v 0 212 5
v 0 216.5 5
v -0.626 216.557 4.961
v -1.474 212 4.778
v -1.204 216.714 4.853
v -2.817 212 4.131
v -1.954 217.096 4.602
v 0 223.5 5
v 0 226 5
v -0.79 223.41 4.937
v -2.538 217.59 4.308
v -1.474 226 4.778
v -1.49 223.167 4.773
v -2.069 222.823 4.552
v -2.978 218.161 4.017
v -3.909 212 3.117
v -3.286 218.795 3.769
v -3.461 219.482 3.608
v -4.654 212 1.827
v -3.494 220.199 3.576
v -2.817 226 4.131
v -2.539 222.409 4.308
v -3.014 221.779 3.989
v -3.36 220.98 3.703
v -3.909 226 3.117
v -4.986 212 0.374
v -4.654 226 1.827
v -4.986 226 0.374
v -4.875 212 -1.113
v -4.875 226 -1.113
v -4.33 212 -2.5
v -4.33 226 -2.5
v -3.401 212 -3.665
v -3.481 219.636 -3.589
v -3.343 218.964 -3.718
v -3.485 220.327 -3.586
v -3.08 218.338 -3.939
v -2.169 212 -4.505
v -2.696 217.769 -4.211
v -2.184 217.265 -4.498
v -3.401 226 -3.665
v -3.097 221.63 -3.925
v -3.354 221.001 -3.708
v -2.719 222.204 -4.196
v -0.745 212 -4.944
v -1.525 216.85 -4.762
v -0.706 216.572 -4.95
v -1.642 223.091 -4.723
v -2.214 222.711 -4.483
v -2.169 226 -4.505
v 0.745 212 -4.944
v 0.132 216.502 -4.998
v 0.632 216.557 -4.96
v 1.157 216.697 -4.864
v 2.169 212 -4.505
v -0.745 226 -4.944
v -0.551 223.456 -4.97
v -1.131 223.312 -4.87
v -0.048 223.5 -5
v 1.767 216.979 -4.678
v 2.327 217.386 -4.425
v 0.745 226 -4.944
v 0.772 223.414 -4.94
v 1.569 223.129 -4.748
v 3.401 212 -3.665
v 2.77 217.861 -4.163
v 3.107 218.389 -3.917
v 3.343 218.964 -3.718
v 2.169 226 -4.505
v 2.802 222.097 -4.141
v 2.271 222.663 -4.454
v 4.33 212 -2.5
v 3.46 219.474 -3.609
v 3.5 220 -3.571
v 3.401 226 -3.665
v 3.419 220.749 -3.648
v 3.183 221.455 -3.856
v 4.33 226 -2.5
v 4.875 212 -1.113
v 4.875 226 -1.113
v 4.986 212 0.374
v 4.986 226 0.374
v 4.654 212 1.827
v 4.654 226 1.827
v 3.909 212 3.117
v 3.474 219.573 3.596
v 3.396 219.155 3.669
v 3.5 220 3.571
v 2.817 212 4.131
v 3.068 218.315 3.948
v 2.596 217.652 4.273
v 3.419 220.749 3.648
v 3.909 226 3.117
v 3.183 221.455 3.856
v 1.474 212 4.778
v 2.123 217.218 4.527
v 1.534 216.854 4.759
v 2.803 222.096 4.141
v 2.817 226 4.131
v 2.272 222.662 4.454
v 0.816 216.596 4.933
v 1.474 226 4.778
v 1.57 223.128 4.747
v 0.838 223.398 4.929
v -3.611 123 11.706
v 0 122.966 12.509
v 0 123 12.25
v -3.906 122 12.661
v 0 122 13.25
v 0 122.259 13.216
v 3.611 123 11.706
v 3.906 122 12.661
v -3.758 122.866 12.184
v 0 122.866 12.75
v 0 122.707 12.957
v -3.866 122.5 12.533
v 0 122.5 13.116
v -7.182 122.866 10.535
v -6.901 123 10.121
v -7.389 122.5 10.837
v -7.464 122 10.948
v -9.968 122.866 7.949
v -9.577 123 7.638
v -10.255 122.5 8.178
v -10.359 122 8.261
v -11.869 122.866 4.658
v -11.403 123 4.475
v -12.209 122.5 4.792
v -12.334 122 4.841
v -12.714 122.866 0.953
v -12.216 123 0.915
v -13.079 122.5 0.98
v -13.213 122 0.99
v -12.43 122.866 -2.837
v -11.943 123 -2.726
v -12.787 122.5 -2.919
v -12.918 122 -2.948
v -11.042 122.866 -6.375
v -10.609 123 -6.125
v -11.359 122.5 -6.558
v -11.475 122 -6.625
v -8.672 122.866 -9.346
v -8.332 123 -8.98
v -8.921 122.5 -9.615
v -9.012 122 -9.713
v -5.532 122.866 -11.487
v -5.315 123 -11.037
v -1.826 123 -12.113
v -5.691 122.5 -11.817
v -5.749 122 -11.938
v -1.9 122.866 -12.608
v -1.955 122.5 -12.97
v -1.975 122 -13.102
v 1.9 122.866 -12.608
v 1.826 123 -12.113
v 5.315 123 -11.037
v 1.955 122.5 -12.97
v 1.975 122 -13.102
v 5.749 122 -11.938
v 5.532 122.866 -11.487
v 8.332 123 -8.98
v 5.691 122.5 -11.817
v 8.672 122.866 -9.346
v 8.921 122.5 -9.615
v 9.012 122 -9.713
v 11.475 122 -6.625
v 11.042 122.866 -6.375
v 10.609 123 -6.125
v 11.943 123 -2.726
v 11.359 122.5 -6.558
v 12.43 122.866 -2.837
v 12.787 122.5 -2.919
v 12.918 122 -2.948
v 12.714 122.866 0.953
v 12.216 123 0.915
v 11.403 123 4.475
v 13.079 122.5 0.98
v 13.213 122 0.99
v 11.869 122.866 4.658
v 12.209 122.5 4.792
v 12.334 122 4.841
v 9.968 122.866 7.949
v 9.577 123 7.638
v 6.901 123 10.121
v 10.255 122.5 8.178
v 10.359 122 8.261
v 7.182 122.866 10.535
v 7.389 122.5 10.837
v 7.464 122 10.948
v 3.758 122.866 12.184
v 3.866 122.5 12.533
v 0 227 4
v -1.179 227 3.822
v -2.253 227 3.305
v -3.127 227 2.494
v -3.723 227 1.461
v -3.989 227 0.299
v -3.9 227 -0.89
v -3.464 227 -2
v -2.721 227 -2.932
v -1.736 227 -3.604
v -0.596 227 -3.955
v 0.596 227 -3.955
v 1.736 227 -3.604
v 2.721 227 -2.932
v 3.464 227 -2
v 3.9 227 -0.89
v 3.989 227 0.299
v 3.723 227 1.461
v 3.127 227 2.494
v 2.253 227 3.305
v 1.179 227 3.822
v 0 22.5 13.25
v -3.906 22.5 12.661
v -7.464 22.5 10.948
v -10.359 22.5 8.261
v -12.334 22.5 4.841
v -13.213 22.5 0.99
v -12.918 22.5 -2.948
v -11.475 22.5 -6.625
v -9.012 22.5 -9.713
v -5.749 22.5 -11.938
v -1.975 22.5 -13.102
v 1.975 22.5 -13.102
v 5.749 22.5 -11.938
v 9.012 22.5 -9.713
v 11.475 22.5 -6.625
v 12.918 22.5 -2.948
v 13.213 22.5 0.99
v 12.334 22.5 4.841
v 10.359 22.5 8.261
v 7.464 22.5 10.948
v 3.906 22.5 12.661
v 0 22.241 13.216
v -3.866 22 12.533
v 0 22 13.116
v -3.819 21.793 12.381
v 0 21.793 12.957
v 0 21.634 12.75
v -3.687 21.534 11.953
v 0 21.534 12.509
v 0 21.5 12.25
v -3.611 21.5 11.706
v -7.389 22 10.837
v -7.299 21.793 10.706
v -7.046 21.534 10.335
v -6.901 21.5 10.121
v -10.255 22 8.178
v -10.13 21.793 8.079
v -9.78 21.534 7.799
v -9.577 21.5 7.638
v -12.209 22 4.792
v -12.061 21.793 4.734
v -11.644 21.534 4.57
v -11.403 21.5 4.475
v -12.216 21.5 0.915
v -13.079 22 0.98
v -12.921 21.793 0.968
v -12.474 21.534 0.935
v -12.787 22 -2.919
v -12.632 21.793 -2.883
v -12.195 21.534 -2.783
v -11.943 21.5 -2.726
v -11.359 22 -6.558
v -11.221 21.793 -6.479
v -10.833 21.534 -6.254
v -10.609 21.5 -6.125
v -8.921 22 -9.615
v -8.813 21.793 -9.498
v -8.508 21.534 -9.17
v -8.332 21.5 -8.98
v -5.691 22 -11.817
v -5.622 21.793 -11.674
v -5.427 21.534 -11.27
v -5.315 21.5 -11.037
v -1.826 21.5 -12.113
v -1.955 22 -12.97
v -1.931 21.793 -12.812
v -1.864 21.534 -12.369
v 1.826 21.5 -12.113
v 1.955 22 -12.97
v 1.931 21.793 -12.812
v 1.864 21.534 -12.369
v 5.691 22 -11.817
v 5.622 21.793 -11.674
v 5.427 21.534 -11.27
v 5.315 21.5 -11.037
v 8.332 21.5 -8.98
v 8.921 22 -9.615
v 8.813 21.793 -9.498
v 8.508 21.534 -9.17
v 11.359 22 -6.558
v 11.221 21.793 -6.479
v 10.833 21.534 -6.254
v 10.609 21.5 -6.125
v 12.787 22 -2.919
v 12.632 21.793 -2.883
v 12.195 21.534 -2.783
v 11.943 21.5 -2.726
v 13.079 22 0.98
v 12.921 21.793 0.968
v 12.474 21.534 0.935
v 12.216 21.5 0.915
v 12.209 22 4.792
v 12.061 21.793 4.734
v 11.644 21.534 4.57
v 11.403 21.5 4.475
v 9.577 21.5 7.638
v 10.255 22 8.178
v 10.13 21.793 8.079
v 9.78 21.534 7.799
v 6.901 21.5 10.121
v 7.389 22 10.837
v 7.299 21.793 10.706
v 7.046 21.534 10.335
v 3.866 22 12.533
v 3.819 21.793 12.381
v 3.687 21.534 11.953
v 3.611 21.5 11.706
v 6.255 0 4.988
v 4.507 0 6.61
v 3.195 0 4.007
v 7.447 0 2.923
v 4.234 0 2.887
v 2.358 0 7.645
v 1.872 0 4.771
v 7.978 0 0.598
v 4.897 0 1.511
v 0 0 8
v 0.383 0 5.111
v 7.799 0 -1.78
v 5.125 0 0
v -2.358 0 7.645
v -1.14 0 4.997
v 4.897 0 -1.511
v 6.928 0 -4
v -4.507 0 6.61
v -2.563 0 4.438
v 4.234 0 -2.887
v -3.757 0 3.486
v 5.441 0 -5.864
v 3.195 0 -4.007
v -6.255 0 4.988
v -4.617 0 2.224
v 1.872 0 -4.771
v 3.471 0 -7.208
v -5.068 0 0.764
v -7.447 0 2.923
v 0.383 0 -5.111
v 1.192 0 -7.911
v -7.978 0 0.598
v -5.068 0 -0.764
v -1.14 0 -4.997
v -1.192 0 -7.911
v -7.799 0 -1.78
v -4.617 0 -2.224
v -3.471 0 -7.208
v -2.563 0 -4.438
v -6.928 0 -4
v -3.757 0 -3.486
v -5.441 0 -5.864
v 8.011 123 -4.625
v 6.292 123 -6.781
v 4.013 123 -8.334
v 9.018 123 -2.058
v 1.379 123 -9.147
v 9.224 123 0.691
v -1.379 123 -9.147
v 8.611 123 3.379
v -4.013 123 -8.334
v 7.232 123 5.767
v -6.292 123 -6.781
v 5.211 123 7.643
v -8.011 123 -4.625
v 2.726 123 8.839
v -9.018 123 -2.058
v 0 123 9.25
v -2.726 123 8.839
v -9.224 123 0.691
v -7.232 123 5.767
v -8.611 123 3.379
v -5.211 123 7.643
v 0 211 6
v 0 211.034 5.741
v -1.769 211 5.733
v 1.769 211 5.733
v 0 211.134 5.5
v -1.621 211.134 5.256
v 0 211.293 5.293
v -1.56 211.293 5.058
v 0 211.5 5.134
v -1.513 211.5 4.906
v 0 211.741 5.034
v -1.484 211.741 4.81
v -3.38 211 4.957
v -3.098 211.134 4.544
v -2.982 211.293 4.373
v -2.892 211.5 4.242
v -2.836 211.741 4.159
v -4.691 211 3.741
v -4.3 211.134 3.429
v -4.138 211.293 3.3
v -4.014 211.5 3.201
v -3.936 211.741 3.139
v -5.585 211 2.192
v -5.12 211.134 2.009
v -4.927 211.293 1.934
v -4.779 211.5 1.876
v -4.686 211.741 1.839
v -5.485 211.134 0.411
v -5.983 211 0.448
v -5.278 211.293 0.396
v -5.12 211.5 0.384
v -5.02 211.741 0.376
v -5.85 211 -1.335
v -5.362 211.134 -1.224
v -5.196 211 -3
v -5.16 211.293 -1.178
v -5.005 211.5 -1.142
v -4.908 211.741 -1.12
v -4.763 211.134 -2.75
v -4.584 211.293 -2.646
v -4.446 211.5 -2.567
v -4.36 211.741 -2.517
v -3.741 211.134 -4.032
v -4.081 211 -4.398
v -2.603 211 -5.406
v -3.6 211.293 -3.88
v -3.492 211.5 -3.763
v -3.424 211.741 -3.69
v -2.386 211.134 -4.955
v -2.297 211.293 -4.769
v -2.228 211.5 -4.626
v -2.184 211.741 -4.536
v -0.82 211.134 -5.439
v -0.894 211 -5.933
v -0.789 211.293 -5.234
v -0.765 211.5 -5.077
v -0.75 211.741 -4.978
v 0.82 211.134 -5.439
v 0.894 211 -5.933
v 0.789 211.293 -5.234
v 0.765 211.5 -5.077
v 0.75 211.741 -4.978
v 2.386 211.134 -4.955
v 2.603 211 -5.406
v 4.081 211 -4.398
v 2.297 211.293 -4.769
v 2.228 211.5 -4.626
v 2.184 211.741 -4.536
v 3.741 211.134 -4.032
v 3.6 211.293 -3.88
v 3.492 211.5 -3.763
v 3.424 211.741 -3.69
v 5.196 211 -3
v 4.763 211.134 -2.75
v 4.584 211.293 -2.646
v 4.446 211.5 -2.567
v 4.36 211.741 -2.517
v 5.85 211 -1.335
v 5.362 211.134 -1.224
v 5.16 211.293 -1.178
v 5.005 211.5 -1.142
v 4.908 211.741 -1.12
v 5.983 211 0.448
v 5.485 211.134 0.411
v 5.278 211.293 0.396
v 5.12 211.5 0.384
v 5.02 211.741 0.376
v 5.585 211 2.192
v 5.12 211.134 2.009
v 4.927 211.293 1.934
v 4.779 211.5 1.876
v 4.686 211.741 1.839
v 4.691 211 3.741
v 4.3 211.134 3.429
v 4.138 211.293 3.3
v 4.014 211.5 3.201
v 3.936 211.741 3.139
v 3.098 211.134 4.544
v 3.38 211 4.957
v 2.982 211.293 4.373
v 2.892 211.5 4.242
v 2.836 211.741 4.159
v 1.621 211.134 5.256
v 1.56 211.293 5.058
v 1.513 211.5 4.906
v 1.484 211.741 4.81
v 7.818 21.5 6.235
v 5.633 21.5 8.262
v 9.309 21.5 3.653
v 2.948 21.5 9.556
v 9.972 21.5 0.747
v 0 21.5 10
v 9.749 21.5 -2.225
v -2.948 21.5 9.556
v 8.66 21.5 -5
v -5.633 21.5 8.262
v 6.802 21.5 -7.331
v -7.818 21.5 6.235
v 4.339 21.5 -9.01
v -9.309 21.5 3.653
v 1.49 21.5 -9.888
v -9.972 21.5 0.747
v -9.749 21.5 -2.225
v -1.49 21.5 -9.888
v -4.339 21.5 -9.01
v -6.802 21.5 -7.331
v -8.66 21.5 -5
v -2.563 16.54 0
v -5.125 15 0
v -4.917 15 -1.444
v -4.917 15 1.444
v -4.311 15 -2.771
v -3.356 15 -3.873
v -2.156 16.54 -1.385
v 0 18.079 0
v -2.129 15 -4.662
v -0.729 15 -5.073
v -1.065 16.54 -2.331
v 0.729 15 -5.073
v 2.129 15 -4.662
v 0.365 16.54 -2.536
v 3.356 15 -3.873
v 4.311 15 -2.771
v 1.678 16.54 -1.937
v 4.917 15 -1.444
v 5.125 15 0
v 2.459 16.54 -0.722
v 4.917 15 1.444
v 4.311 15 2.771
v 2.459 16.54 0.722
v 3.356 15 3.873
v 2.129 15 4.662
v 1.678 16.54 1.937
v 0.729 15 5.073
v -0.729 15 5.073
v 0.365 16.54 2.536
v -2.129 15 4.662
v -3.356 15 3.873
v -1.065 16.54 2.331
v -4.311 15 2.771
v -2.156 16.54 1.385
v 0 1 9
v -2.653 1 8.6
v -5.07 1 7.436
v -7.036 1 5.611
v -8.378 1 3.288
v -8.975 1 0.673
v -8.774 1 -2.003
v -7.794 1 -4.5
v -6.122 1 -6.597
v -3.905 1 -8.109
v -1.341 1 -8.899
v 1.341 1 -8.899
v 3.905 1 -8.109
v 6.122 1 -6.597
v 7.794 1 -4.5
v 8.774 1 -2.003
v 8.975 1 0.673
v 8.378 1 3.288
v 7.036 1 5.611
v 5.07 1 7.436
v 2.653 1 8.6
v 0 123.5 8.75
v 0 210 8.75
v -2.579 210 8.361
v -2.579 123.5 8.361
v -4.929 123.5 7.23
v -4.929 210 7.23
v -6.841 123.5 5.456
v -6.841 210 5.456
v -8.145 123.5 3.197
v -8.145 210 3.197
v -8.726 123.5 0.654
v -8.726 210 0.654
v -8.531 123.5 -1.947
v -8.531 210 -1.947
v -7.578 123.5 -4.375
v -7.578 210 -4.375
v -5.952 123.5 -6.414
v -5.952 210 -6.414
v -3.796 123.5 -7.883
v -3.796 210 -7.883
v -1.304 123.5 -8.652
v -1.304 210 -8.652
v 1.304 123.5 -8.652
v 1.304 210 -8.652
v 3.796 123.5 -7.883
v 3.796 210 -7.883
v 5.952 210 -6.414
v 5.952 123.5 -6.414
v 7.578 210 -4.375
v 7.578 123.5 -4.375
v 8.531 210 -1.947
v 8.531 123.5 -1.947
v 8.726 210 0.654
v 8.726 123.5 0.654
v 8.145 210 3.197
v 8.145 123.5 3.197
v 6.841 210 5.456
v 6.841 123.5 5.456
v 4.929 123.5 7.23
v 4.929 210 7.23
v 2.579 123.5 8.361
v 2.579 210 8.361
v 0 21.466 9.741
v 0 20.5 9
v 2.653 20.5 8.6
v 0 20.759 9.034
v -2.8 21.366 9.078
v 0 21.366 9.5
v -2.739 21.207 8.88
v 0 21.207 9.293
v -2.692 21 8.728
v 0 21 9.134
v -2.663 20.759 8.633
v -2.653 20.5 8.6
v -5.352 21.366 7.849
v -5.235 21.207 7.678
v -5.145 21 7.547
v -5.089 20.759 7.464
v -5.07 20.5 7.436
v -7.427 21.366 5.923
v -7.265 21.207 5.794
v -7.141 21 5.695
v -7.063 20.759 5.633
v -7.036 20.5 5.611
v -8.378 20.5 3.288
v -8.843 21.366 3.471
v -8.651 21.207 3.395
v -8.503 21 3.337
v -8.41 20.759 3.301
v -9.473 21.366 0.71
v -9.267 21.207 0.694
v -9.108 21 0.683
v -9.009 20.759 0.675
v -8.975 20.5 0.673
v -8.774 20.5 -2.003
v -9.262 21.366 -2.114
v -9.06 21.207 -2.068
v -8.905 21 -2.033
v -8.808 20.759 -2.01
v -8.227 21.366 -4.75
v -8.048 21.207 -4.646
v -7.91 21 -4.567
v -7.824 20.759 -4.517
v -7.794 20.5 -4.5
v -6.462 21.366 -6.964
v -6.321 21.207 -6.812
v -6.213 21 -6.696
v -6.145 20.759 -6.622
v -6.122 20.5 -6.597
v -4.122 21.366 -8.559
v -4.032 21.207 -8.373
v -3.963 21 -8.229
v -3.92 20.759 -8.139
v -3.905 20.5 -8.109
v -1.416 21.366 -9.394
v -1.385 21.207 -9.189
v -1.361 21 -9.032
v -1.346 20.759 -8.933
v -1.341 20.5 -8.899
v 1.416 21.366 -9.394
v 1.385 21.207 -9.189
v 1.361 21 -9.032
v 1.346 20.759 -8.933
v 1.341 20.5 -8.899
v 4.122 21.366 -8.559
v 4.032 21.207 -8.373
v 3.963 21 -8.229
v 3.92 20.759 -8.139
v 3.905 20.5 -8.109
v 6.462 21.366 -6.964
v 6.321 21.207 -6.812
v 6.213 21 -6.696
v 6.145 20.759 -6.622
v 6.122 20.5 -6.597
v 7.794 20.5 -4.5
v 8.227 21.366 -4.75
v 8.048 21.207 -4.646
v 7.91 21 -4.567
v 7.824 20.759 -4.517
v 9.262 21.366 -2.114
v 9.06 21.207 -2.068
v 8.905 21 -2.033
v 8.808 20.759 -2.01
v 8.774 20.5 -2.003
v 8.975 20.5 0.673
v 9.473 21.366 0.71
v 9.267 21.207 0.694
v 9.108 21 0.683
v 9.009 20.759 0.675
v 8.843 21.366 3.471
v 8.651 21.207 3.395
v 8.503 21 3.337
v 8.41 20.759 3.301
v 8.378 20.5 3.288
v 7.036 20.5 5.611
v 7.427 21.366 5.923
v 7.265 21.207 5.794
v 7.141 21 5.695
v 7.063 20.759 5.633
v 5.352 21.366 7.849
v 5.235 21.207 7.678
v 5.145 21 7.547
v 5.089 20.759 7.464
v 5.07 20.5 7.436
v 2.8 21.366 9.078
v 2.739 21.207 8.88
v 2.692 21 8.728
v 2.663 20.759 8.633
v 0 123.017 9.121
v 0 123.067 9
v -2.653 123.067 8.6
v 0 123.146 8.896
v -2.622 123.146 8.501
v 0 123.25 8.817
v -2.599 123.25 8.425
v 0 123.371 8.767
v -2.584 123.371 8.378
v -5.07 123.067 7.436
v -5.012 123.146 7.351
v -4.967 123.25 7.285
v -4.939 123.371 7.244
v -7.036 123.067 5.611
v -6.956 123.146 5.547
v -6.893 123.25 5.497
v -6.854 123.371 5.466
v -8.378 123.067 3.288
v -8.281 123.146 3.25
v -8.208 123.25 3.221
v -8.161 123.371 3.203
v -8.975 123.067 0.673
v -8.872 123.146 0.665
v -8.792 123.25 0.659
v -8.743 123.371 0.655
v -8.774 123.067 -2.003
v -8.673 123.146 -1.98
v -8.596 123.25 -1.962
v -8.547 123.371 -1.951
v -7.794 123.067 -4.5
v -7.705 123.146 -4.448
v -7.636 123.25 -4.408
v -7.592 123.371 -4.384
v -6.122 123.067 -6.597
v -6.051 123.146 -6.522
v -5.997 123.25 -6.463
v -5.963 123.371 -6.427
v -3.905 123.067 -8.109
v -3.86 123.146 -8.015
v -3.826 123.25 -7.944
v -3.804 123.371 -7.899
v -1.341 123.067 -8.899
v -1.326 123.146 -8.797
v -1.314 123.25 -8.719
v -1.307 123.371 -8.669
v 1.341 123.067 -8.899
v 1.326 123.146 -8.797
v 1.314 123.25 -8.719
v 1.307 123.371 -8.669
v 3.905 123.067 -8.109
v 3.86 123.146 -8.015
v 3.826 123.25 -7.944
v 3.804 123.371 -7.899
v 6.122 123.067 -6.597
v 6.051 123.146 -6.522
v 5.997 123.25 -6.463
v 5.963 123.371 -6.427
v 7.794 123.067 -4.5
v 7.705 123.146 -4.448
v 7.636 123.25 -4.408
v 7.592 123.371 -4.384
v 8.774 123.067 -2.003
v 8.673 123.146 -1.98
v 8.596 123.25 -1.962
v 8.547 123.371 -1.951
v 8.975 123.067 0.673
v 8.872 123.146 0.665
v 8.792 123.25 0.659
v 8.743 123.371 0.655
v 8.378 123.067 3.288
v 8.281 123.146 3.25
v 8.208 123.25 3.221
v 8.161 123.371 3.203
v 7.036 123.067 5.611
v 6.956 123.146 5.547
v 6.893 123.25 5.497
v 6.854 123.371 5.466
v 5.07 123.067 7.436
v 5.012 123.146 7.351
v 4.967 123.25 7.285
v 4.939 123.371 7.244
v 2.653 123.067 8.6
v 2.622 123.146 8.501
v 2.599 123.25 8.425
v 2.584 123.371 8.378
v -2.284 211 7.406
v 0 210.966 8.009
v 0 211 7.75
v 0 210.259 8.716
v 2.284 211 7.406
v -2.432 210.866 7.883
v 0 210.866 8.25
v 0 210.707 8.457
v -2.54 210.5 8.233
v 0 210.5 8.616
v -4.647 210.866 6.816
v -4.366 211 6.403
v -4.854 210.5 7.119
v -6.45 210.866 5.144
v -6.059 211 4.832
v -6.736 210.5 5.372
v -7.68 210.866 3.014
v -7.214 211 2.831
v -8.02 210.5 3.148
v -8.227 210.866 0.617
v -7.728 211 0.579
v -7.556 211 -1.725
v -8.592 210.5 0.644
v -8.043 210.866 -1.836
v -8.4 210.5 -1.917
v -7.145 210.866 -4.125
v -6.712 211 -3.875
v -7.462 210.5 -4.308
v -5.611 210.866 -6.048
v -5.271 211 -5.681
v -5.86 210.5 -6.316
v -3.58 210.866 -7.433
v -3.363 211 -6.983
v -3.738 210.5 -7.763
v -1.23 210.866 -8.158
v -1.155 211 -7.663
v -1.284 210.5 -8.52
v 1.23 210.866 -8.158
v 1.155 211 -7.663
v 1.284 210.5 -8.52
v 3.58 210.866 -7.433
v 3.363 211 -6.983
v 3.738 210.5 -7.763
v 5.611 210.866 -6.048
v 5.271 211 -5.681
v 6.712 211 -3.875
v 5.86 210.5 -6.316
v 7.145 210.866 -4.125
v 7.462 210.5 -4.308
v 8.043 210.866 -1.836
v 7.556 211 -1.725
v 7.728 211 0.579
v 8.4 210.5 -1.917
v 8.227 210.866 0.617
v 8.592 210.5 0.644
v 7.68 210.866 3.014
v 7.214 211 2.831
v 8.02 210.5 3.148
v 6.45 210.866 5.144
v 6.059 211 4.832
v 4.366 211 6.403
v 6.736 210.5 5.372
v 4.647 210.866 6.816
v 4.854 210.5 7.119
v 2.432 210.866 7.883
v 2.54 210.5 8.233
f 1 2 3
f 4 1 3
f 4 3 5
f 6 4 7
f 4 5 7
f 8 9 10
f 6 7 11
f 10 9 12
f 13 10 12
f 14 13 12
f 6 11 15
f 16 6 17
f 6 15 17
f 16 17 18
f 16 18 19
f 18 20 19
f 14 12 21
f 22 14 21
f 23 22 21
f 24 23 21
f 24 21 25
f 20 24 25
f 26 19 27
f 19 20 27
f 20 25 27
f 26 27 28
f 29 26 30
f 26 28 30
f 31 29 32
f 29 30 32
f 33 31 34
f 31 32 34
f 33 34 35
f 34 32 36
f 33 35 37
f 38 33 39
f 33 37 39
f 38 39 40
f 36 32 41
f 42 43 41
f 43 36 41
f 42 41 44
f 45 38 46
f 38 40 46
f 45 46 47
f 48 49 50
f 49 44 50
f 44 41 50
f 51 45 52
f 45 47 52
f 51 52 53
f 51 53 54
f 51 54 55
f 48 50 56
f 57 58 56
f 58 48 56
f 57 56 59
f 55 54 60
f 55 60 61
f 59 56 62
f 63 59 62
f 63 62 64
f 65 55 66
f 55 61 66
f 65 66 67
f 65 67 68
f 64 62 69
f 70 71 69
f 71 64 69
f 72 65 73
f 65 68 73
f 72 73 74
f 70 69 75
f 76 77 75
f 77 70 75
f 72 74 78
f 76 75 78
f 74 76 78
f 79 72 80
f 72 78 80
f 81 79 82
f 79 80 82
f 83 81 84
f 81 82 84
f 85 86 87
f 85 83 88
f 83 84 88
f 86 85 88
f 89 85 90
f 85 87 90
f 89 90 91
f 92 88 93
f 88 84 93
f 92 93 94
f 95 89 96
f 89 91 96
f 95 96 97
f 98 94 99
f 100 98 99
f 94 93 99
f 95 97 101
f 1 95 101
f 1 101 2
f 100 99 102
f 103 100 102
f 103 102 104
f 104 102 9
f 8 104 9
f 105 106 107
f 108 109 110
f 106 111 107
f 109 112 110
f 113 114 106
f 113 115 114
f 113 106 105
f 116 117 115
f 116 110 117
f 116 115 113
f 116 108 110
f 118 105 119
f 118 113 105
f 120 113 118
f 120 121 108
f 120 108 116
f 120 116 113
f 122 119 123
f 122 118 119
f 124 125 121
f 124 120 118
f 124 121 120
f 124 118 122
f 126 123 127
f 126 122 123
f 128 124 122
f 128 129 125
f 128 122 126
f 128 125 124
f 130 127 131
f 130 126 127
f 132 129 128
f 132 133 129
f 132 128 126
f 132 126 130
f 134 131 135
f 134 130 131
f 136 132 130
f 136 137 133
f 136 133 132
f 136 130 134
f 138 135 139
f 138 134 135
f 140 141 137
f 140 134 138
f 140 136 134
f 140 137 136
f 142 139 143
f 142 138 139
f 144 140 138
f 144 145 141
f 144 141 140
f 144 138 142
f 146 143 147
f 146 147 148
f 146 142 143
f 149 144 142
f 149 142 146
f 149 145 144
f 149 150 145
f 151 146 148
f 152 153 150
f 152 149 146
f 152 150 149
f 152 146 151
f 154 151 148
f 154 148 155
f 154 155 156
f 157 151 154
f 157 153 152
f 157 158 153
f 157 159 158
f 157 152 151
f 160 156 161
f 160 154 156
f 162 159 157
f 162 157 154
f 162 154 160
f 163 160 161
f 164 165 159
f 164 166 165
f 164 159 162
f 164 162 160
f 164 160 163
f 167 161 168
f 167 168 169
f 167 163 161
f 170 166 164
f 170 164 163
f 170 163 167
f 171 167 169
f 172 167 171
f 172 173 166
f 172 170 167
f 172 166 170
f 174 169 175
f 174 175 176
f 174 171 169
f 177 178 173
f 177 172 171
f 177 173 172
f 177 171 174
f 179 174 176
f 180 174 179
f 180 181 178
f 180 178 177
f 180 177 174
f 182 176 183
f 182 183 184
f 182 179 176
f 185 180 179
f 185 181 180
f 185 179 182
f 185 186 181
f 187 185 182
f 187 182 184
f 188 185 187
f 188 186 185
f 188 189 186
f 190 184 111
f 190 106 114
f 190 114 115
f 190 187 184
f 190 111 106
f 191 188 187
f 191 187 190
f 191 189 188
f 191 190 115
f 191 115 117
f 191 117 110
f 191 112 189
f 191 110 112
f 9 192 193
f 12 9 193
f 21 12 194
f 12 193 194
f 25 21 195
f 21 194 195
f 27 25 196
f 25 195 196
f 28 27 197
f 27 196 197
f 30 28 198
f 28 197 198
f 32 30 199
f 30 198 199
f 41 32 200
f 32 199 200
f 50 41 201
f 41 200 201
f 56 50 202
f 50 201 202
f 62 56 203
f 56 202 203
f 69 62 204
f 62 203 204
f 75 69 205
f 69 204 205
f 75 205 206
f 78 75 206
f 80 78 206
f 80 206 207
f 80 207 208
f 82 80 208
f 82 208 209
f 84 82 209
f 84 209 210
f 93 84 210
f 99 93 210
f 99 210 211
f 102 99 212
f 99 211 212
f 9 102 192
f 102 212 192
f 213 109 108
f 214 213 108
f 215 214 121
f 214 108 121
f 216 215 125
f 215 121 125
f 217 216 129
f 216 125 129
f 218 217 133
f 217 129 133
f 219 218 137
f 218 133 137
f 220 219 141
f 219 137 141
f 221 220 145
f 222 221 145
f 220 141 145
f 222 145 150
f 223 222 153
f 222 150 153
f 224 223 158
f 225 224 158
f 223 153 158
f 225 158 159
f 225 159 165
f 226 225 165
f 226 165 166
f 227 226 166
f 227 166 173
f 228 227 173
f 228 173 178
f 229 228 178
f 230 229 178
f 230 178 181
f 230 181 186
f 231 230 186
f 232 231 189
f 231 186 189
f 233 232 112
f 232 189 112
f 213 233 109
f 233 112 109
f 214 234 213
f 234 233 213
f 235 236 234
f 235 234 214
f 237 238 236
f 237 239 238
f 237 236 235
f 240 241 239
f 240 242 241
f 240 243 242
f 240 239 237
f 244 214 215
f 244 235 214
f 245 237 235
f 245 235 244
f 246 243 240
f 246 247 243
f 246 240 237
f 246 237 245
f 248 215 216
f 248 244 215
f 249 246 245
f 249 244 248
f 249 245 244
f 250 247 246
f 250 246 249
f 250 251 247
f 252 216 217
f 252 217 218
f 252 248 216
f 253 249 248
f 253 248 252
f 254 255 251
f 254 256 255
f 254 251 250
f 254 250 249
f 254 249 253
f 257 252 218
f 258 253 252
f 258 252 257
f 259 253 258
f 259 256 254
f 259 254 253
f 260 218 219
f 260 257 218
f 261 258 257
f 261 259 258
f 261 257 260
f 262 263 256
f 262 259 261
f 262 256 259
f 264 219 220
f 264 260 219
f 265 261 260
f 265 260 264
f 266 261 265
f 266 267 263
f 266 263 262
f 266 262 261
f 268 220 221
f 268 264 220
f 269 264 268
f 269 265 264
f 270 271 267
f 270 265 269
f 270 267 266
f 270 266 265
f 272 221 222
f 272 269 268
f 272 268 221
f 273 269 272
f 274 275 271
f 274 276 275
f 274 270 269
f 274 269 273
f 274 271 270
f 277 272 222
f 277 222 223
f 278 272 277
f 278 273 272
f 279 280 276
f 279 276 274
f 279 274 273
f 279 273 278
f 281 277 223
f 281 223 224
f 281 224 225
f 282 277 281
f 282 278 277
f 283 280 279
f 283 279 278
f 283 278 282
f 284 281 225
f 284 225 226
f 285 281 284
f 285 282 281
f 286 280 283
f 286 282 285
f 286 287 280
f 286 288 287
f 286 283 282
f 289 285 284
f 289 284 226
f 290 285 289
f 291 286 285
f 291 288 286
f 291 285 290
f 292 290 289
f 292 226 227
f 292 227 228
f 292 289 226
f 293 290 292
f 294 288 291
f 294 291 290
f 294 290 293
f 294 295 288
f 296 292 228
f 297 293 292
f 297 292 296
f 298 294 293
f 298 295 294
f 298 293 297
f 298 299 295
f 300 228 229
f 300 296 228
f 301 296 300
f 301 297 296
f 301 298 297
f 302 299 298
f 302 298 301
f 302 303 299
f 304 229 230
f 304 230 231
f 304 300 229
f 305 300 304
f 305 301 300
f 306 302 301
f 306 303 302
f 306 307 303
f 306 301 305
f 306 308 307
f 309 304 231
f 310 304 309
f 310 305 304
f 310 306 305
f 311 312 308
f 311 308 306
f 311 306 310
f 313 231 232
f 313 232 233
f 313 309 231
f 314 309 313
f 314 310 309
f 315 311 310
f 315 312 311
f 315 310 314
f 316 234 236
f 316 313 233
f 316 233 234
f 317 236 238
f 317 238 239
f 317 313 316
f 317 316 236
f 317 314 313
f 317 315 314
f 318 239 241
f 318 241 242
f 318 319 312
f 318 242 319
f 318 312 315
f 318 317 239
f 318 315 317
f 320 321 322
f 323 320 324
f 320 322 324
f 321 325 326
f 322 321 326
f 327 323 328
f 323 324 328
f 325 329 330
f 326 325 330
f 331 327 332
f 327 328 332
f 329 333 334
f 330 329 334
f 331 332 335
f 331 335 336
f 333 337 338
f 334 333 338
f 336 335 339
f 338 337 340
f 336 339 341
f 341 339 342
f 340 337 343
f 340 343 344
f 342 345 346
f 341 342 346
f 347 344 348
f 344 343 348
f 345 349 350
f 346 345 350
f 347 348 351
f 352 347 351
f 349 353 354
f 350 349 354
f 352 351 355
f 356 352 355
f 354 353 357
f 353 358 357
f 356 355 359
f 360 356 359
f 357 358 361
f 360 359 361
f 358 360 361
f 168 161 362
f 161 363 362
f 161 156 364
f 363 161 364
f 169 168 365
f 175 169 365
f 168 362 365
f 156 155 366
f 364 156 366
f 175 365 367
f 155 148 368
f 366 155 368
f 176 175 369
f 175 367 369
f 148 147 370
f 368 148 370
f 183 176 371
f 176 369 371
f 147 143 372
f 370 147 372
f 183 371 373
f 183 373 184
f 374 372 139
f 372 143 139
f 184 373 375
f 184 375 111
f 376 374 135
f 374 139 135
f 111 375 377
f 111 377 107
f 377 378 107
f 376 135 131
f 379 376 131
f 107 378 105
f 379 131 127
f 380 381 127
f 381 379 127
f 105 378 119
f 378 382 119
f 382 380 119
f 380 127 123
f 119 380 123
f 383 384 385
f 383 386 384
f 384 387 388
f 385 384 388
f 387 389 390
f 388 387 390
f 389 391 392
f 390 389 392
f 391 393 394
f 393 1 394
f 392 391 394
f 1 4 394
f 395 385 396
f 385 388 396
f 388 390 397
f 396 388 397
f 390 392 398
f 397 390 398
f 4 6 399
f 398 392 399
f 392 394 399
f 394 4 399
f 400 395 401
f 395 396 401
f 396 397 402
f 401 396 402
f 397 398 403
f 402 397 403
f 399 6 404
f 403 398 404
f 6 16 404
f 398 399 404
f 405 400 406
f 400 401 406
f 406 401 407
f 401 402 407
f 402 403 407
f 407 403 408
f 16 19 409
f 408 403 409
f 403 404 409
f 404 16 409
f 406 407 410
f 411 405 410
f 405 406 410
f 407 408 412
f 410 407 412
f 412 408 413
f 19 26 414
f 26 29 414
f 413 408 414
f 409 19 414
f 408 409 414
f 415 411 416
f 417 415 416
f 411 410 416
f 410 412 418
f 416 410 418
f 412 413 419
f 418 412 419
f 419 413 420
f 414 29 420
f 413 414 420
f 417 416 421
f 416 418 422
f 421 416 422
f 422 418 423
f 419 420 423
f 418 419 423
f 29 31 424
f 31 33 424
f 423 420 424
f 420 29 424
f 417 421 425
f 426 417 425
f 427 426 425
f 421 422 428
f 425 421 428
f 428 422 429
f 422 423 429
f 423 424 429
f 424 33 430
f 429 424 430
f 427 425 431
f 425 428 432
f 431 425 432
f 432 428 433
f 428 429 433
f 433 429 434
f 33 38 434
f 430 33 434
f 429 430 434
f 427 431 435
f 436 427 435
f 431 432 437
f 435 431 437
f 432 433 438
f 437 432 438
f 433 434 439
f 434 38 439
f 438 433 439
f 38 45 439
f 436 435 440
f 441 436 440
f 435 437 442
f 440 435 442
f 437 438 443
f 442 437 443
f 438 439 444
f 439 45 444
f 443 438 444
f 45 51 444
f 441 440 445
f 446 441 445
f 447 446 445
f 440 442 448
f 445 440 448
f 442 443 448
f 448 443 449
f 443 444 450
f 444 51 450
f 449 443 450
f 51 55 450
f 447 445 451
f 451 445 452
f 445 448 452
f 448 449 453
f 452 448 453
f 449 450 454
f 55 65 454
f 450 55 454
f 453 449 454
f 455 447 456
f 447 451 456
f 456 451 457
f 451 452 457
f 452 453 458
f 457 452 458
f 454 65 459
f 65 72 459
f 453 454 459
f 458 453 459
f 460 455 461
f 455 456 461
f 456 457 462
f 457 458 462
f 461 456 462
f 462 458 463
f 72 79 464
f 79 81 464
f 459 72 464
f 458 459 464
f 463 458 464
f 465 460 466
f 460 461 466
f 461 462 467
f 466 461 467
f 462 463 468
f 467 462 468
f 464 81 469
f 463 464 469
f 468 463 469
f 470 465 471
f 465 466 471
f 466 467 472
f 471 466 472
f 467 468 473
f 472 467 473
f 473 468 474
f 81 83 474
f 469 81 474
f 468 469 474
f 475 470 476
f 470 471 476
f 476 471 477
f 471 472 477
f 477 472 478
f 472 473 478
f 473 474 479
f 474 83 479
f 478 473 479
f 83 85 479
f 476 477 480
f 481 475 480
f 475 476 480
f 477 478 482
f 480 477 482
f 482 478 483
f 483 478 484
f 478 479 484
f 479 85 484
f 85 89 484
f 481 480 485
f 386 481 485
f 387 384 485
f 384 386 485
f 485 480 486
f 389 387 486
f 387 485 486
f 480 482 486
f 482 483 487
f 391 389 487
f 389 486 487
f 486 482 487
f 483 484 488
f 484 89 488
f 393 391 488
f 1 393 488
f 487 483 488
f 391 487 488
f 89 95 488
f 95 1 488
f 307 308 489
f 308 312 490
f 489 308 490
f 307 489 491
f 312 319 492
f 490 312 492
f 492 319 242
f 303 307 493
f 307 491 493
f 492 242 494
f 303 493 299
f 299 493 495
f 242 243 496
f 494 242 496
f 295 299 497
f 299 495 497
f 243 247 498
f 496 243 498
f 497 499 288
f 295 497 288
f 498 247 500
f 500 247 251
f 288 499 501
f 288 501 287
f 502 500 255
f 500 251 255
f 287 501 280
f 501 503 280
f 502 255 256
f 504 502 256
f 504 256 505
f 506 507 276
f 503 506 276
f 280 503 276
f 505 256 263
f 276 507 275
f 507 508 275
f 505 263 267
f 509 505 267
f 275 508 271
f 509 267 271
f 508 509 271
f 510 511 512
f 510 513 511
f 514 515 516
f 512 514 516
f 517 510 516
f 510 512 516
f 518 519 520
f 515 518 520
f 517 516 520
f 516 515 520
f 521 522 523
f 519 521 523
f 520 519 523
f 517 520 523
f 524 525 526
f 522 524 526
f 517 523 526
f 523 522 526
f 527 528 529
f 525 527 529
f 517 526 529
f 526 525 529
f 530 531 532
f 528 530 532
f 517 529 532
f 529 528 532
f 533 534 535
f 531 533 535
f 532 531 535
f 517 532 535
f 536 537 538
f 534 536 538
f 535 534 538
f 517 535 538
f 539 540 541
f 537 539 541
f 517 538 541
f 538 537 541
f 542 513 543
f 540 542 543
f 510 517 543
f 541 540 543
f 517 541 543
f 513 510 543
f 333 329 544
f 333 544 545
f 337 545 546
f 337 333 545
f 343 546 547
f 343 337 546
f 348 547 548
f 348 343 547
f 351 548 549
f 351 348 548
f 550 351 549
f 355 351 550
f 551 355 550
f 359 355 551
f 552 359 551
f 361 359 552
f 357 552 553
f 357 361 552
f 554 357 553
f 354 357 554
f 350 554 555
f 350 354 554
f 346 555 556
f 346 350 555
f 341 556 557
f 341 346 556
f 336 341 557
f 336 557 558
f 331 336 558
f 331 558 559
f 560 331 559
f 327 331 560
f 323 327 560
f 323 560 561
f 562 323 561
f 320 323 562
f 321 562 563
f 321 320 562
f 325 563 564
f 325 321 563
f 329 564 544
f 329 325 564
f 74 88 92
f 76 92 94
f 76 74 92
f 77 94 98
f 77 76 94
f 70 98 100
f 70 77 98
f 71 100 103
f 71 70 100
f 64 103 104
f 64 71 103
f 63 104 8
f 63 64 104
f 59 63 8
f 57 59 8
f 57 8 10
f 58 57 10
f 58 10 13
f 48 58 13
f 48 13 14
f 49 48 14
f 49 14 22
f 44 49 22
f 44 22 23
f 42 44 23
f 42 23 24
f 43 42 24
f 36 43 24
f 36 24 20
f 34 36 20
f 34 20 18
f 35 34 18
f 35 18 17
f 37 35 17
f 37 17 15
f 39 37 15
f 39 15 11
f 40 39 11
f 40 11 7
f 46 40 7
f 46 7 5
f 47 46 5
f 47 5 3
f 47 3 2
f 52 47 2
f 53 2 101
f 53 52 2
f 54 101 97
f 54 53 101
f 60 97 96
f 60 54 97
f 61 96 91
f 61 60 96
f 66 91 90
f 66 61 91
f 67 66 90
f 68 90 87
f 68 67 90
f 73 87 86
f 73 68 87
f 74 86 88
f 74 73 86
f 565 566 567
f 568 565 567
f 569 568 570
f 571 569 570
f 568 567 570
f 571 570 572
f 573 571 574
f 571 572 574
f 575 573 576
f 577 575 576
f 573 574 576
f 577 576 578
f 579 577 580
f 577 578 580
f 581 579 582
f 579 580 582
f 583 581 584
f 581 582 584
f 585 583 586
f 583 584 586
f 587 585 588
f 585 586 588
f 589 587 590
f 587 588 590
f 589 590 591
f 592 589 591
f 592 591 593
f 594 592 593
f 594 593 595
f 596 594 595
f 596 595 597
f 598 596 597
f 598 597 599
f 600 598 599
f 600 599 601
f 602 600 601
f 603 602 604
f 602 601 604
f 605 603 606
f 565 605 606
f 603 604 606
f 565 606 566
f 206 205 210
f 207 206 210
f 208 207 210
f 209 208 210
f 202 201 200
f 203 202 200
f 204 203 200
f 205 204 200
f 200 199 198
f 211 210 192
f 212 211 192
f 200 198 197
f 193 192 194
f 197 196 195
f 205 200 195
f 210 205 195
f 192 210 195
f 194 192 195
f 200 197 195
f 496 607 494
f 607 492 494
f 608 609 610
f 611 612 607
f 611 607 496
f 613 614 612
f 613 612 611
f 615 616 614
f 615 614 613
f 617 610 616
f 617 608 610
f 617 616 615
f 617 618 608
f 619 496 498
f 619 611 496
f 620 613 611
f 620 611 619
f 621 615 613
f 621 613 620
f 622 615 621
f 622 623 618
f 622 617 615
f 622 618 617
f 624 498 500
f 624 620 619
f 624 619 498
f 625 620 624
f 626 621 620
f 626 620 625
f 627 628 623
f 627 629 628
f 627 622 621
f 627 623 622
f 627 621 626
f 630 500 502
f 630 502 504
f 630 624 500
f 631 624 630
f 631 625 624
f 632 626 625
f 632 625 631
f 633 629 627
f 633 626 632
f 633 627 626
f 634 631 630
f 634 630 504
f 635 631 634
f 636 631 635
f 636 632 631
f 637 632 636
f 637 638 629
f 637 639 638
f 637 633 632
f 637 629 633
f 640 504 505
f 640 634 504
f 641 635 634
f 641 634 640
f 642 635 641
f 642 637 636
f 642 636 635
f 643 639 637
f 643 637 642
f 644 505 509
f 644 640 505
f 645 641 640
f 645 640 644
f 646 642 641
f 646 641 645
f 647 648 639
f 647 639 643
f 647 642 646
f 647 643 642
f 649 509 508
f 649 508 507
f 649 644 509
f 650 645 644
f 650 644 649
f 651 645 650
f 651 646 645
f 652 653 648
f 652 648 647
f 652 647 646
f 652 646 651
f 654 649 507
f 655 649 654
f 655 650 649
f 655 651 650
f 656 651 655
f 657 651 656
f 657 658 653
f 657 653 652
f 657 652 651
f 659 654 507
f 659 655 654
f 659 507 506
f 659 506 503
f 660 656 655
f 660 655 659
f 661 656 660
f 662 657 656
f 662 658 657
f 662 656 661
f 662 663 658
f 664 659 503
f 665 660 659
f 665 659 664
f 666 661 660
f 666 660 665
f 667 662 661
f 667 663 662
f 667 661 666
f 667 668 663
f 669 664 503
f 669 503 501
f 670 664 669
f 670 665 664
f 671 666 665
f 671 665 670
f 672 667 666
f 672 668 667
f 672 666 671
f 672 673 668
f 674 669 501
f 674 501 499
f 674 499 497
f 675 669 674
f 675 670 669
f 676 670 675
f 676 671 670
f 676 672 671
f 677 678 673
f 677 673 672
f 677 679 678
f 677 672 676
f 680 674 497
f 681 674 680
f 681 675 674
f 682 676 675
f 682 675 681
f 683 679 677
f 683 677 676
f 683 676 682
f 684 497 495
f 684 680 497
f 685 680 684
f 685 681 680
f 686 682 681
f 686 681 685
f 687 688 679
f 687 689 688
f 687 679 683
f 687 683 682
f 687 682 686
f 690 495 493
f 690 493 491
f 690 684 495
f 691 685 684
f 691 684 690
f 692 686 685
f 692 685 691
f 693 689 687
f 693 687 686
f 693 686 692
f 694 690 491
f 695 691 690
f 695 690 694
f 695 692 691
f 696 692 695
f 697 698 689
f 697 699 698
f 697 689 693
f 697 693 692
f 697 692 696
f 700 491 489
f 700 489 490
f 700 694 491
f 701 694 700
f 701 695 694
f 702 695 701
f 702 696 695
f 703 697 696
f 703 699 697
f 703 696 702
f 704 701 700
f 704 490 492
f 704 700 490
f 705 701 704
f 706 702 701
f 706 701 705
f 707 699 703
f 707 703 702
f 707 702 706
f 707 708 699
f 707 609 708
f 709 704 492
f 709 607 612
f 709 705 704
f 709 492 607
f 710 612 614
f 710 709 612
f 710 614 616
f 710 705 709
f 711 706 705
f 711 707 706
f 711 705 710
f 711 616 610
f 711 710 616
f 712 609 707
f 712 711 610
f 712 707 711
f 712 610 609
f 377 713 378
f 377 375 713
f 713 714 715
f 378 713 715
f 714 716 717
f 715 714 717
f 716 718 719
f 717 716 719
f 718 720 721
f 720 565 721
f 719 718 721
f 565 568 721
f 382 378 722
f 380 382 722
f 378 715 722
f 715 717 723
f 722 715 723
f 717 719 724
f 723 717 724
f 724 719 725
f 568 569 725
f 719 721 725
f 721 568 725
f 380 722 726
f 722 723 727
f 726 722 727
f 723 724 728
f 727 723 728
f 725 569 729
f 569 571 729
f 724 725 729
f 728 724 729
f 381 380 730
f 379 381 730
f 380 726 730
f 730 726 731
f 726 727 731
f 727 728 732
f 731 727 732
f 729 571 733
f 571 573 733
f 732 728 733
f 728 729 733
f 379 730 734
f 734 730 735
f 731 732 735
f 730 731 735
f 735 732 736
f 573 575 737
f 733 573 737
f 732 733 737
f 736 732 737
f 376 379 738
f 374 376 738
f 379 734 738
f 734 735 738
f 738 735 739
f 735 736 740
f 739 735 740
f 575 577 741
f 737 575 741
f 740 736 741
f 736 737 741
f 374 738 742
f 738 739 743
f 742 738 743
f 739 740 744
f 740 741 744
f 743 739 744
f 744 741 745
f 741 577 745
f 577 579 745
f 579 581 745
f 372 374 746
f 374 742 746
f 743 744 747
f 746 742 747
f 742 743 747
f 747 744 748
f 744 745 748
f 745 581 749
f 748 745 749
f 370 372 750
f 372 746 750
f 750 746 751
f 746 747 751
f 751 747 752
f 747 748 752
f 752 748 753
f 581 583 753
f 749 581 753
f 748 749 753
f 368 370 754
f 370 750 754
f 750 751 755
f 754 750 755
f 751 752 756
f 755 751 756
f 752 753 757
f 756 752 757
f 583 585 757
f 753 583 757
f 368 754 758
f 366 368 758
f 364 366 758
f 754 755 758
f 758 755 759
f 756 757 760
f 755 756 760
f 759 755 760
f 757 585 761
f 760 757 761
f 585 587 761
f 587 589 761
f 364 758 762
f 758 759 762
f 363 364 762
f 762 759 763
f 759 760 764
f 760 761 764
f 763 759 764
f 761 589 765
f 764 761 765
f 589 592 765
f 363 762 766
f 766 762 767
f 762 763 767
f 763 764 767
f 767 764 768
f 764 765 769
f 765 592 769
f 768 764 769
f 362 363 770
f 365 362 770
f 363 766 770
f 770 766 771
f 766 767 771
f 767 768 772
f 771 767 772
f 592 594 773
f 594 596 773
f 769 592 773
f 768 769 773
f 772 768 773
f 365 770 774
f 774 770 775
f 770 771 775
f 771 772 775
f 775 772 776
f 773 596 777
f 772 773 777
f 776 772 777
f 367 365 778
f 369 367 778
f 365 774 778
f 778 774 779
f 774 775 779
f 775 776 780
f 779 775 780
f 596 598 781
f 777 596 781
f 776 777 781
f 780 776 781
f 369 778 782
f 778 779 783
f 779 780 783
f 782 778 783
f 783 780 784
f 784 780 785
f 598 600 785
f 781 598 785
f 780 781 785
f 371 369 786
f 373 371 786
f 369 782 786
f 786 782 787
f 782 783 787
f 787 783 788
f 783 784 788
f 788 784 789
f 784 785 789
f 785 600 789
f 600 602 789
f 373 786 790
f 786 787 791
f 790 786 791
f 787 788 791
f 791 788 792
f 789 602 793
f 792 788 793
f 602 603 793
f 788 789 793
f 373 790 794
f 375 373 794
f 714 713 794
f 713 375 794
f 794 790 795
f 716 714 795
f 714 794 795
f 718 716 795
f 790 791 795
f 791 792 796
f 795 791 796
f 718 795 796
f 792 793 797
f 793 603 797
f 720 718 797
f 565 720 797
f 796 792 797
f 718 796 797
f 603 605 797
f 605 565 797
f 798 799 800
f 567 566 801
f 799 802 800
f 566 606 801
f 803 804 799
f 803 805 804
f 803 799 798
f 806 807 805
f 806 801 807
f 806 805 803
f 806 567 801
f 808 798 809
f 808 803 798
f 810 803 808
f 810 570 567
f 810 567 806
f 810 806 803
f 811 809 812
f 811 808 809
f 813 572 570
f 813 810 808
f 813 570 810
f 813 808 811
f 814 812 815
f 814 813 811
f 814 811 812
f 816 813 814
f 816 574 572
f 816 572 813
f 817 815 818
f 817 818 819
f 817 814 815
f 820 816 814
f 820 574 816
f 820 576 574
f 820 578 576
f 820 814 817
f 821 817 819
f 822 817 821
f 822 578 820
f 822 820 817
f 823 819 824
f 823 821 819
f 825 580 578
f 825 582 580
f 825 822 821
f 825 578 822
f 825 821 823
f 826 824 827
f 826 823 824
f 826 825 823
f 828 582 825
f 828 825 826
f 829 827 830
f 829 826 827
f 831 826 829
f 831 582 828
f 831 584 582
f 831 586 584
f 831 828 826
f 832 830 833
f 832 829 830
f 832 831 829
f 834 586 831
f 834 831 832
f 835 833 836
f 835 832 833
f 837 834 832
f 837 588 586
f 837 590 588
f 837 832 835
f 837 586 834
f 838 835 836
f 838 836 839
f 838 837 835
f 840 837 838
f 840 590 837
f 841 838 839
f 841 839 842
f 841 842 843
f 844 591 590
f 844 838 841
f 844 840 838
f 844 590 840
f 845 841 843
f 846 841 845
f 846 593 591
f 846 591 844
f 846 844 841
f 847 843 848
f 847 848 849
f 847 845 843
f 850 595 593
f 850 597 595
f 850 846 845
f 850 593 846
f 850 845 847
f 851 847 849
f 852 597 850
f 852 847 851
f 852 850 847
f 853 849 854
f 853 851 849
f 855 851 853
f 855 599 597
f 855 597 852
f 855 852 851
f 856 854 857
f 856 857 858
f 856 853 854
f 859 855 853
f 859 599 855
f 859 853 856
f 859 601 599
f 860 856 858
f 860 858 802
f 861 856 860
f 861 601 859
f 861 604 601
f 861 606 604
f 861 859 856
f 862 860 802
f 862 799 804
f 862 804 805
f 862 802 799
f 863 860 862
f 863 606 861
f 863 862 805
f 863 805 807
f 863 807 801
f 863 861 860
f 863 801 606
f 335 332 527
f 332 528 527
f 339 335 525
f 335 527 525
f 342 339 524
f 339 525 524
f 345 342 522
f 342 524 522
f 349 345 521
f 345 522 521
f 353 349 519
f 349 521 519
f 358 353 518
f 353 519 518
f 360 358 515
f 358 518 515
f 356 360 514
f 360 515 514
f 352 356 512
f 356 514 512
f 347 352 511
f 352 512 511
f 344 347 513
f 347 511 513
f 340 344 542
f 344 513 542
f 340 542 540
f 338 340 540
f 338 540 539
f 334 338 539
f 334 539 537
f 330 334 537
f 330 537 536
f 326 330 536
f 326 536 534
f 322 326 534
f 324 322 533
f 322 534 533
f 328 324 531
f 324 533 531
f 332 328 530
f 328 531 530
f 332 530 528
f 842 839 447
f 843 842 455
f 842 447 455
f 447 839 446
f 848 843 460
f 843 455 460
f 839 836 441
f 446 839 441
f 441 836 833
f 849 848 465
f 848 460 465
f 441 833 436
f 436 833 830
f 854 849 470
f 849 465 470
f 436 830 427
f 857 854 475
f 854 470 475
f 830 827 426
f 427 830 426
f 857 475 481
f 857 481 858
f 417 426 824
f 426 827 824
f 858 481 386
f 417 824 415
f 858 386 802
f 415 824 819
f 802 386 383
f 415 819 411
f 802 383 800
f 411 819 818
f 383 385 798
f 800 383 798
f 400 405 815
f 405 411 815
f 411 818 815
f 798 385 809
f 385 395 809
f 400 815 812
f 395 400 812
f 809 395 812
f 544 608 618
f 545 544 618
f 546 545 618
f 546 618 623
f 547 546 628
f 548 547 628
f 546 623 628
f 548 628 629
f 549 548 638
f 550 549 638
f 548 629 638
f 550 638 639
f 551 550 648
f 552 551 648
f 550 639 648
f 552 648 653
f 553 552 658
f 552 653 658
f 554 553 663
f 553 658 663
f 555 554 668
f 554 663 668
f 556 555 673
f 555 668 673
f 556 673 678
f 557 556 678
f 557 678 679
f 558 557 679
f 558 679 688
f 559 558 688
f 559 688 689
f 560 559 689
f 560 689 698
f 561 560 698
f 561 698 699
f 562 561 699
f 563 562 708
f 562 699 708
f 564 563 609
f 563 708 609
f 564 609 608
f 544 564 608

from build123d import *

# Parameters (mm, degrees)
CORTAR_EXTRUIR1_DEPTH             = 228.772090037
CORTAR_EXTRUIR1_DEPTH_BACK        = 228.772090037
CROQUIS3_R                        = 3.5
CHAFL_N2_SIZE                     = 1
REDONDEO1_R                       = 1
REDONDEO3_R                       = 1
CHAFL_N3_SIZE                     = 1
TALADRO_DE_MARGEN_PARA_M121_D     = 10.25
TALADRO_DE_MARGEN_PARA_M121_DEPTH = 15
TALADRO_DE_MARGEN_PARA_M121_TIP   = 3.079410673
REDONDEO4_R                       = 0.5


with BuildPart() as part:
    # Croquis1 → Revolución1 (revolve)
    with BuildSketch(Plane(origin=(0, 0, 0), x_dir=(0, 0, -1), z_dir=(1, 0, 0)), mode=Mode.PRIVATE) as revoluci_n1_sk:
        Polygon((0, 227), (0, 0), (9, 0), (9, 21.5), (13.25, 21.5), (13.25, 123), (8.75, 123), (8.75, 211), (5, 211), (5, 227), align=None)
    revolve(revoluci_n1_sk.sketch.rotate(Axis((0, 227, 0), (0, -1, 0)), 180), axis=Axis((0, 227, 0), (0, -1, 0)))

    # Croquis3 → Cortar-Extruir1 (cut, two sides: drawn at the far end of the back side and taken through both)
    with BuildSketch(Plane.XY.offset(-CORTAR_EXTRUIR1_DEPTH_BACK)):
        with Locations((0, 220)):
            Circle(CROQUIS3_R)
    extrude(amount=CORTAR_EXTRUIR1_DEPTH + CORTAR_EXTRUIR1_DEPTH_BACK, mode=Mode.SUBTRACT)

    # Chaflán2
    chafl_n2_edges = [part.edges().sort_by_distance(p)[0] for p in [
        (0, 227, -5),
    ]]
    chamfer(chafl_n2_edges, length=CHAFL_N2_SIZE)

    # Redondeo1
    redondeo1_edges = [part.edges().sort_by_distance(p)[0] for p in [
        (0, 21.5, -13.25),
        (0, 21.5, -9),
        (0, 211, -8.75),
        (0, 123, -13.25),
    ]]
    fillet(redondeo1_edges, radius=REDONDEO1_R)

    # Redondeo3
    redondeo3_edges = [part.edges().sort_by_distance(p)[0] for p in [
        (0, 211, -5),
    ]]
    fillet(redondeo3_edges, radius=REDONDEO3_R)

    # Chaflán3
    chafl_n3_edges = [part.edges().sort_by_distance(p)[0] for p in [
        (0, 0, -9),
    ]]
    chamfer(chafl_n3_edges, length=CHAFL_N3_SIZE)

    # Taladro de margen para M121
    with Locations(Plane(origin=(0, 0, 0), x_dir=(-1, 0, 0), z_dir=(0, -1, 0))):
        with Locations((0, 0)):
            Hole(TALADRO_DE_MARGEN_PARA_M121_D / 2, depth=TALADRO_DE_MARGEN_PARA_M121_DEPTH)
            with Locations((0, 0, -(TALADRO_DE_MARGEN_PARA_M121_DEPTH + TALADRO_DE_MARGEN_PARA_M121_TIP / 2))):  # 118° drill point
                Cone(0, TALADRO_DE_MARGEN_PARA_M121_D / 2, TALADRO_DE_MARGEN_PARA_M121_TIP, mode=Mode.SUBTRACT)

    # Redondeo4
    redondeo4_edges = [part.edges().sort_by_distance(p)[0] for p in [
        (0, 123, -8.75),
    ]]
    fillet(redondeo4_edges, radius=REDONDEO4_R)


solid = part.part
